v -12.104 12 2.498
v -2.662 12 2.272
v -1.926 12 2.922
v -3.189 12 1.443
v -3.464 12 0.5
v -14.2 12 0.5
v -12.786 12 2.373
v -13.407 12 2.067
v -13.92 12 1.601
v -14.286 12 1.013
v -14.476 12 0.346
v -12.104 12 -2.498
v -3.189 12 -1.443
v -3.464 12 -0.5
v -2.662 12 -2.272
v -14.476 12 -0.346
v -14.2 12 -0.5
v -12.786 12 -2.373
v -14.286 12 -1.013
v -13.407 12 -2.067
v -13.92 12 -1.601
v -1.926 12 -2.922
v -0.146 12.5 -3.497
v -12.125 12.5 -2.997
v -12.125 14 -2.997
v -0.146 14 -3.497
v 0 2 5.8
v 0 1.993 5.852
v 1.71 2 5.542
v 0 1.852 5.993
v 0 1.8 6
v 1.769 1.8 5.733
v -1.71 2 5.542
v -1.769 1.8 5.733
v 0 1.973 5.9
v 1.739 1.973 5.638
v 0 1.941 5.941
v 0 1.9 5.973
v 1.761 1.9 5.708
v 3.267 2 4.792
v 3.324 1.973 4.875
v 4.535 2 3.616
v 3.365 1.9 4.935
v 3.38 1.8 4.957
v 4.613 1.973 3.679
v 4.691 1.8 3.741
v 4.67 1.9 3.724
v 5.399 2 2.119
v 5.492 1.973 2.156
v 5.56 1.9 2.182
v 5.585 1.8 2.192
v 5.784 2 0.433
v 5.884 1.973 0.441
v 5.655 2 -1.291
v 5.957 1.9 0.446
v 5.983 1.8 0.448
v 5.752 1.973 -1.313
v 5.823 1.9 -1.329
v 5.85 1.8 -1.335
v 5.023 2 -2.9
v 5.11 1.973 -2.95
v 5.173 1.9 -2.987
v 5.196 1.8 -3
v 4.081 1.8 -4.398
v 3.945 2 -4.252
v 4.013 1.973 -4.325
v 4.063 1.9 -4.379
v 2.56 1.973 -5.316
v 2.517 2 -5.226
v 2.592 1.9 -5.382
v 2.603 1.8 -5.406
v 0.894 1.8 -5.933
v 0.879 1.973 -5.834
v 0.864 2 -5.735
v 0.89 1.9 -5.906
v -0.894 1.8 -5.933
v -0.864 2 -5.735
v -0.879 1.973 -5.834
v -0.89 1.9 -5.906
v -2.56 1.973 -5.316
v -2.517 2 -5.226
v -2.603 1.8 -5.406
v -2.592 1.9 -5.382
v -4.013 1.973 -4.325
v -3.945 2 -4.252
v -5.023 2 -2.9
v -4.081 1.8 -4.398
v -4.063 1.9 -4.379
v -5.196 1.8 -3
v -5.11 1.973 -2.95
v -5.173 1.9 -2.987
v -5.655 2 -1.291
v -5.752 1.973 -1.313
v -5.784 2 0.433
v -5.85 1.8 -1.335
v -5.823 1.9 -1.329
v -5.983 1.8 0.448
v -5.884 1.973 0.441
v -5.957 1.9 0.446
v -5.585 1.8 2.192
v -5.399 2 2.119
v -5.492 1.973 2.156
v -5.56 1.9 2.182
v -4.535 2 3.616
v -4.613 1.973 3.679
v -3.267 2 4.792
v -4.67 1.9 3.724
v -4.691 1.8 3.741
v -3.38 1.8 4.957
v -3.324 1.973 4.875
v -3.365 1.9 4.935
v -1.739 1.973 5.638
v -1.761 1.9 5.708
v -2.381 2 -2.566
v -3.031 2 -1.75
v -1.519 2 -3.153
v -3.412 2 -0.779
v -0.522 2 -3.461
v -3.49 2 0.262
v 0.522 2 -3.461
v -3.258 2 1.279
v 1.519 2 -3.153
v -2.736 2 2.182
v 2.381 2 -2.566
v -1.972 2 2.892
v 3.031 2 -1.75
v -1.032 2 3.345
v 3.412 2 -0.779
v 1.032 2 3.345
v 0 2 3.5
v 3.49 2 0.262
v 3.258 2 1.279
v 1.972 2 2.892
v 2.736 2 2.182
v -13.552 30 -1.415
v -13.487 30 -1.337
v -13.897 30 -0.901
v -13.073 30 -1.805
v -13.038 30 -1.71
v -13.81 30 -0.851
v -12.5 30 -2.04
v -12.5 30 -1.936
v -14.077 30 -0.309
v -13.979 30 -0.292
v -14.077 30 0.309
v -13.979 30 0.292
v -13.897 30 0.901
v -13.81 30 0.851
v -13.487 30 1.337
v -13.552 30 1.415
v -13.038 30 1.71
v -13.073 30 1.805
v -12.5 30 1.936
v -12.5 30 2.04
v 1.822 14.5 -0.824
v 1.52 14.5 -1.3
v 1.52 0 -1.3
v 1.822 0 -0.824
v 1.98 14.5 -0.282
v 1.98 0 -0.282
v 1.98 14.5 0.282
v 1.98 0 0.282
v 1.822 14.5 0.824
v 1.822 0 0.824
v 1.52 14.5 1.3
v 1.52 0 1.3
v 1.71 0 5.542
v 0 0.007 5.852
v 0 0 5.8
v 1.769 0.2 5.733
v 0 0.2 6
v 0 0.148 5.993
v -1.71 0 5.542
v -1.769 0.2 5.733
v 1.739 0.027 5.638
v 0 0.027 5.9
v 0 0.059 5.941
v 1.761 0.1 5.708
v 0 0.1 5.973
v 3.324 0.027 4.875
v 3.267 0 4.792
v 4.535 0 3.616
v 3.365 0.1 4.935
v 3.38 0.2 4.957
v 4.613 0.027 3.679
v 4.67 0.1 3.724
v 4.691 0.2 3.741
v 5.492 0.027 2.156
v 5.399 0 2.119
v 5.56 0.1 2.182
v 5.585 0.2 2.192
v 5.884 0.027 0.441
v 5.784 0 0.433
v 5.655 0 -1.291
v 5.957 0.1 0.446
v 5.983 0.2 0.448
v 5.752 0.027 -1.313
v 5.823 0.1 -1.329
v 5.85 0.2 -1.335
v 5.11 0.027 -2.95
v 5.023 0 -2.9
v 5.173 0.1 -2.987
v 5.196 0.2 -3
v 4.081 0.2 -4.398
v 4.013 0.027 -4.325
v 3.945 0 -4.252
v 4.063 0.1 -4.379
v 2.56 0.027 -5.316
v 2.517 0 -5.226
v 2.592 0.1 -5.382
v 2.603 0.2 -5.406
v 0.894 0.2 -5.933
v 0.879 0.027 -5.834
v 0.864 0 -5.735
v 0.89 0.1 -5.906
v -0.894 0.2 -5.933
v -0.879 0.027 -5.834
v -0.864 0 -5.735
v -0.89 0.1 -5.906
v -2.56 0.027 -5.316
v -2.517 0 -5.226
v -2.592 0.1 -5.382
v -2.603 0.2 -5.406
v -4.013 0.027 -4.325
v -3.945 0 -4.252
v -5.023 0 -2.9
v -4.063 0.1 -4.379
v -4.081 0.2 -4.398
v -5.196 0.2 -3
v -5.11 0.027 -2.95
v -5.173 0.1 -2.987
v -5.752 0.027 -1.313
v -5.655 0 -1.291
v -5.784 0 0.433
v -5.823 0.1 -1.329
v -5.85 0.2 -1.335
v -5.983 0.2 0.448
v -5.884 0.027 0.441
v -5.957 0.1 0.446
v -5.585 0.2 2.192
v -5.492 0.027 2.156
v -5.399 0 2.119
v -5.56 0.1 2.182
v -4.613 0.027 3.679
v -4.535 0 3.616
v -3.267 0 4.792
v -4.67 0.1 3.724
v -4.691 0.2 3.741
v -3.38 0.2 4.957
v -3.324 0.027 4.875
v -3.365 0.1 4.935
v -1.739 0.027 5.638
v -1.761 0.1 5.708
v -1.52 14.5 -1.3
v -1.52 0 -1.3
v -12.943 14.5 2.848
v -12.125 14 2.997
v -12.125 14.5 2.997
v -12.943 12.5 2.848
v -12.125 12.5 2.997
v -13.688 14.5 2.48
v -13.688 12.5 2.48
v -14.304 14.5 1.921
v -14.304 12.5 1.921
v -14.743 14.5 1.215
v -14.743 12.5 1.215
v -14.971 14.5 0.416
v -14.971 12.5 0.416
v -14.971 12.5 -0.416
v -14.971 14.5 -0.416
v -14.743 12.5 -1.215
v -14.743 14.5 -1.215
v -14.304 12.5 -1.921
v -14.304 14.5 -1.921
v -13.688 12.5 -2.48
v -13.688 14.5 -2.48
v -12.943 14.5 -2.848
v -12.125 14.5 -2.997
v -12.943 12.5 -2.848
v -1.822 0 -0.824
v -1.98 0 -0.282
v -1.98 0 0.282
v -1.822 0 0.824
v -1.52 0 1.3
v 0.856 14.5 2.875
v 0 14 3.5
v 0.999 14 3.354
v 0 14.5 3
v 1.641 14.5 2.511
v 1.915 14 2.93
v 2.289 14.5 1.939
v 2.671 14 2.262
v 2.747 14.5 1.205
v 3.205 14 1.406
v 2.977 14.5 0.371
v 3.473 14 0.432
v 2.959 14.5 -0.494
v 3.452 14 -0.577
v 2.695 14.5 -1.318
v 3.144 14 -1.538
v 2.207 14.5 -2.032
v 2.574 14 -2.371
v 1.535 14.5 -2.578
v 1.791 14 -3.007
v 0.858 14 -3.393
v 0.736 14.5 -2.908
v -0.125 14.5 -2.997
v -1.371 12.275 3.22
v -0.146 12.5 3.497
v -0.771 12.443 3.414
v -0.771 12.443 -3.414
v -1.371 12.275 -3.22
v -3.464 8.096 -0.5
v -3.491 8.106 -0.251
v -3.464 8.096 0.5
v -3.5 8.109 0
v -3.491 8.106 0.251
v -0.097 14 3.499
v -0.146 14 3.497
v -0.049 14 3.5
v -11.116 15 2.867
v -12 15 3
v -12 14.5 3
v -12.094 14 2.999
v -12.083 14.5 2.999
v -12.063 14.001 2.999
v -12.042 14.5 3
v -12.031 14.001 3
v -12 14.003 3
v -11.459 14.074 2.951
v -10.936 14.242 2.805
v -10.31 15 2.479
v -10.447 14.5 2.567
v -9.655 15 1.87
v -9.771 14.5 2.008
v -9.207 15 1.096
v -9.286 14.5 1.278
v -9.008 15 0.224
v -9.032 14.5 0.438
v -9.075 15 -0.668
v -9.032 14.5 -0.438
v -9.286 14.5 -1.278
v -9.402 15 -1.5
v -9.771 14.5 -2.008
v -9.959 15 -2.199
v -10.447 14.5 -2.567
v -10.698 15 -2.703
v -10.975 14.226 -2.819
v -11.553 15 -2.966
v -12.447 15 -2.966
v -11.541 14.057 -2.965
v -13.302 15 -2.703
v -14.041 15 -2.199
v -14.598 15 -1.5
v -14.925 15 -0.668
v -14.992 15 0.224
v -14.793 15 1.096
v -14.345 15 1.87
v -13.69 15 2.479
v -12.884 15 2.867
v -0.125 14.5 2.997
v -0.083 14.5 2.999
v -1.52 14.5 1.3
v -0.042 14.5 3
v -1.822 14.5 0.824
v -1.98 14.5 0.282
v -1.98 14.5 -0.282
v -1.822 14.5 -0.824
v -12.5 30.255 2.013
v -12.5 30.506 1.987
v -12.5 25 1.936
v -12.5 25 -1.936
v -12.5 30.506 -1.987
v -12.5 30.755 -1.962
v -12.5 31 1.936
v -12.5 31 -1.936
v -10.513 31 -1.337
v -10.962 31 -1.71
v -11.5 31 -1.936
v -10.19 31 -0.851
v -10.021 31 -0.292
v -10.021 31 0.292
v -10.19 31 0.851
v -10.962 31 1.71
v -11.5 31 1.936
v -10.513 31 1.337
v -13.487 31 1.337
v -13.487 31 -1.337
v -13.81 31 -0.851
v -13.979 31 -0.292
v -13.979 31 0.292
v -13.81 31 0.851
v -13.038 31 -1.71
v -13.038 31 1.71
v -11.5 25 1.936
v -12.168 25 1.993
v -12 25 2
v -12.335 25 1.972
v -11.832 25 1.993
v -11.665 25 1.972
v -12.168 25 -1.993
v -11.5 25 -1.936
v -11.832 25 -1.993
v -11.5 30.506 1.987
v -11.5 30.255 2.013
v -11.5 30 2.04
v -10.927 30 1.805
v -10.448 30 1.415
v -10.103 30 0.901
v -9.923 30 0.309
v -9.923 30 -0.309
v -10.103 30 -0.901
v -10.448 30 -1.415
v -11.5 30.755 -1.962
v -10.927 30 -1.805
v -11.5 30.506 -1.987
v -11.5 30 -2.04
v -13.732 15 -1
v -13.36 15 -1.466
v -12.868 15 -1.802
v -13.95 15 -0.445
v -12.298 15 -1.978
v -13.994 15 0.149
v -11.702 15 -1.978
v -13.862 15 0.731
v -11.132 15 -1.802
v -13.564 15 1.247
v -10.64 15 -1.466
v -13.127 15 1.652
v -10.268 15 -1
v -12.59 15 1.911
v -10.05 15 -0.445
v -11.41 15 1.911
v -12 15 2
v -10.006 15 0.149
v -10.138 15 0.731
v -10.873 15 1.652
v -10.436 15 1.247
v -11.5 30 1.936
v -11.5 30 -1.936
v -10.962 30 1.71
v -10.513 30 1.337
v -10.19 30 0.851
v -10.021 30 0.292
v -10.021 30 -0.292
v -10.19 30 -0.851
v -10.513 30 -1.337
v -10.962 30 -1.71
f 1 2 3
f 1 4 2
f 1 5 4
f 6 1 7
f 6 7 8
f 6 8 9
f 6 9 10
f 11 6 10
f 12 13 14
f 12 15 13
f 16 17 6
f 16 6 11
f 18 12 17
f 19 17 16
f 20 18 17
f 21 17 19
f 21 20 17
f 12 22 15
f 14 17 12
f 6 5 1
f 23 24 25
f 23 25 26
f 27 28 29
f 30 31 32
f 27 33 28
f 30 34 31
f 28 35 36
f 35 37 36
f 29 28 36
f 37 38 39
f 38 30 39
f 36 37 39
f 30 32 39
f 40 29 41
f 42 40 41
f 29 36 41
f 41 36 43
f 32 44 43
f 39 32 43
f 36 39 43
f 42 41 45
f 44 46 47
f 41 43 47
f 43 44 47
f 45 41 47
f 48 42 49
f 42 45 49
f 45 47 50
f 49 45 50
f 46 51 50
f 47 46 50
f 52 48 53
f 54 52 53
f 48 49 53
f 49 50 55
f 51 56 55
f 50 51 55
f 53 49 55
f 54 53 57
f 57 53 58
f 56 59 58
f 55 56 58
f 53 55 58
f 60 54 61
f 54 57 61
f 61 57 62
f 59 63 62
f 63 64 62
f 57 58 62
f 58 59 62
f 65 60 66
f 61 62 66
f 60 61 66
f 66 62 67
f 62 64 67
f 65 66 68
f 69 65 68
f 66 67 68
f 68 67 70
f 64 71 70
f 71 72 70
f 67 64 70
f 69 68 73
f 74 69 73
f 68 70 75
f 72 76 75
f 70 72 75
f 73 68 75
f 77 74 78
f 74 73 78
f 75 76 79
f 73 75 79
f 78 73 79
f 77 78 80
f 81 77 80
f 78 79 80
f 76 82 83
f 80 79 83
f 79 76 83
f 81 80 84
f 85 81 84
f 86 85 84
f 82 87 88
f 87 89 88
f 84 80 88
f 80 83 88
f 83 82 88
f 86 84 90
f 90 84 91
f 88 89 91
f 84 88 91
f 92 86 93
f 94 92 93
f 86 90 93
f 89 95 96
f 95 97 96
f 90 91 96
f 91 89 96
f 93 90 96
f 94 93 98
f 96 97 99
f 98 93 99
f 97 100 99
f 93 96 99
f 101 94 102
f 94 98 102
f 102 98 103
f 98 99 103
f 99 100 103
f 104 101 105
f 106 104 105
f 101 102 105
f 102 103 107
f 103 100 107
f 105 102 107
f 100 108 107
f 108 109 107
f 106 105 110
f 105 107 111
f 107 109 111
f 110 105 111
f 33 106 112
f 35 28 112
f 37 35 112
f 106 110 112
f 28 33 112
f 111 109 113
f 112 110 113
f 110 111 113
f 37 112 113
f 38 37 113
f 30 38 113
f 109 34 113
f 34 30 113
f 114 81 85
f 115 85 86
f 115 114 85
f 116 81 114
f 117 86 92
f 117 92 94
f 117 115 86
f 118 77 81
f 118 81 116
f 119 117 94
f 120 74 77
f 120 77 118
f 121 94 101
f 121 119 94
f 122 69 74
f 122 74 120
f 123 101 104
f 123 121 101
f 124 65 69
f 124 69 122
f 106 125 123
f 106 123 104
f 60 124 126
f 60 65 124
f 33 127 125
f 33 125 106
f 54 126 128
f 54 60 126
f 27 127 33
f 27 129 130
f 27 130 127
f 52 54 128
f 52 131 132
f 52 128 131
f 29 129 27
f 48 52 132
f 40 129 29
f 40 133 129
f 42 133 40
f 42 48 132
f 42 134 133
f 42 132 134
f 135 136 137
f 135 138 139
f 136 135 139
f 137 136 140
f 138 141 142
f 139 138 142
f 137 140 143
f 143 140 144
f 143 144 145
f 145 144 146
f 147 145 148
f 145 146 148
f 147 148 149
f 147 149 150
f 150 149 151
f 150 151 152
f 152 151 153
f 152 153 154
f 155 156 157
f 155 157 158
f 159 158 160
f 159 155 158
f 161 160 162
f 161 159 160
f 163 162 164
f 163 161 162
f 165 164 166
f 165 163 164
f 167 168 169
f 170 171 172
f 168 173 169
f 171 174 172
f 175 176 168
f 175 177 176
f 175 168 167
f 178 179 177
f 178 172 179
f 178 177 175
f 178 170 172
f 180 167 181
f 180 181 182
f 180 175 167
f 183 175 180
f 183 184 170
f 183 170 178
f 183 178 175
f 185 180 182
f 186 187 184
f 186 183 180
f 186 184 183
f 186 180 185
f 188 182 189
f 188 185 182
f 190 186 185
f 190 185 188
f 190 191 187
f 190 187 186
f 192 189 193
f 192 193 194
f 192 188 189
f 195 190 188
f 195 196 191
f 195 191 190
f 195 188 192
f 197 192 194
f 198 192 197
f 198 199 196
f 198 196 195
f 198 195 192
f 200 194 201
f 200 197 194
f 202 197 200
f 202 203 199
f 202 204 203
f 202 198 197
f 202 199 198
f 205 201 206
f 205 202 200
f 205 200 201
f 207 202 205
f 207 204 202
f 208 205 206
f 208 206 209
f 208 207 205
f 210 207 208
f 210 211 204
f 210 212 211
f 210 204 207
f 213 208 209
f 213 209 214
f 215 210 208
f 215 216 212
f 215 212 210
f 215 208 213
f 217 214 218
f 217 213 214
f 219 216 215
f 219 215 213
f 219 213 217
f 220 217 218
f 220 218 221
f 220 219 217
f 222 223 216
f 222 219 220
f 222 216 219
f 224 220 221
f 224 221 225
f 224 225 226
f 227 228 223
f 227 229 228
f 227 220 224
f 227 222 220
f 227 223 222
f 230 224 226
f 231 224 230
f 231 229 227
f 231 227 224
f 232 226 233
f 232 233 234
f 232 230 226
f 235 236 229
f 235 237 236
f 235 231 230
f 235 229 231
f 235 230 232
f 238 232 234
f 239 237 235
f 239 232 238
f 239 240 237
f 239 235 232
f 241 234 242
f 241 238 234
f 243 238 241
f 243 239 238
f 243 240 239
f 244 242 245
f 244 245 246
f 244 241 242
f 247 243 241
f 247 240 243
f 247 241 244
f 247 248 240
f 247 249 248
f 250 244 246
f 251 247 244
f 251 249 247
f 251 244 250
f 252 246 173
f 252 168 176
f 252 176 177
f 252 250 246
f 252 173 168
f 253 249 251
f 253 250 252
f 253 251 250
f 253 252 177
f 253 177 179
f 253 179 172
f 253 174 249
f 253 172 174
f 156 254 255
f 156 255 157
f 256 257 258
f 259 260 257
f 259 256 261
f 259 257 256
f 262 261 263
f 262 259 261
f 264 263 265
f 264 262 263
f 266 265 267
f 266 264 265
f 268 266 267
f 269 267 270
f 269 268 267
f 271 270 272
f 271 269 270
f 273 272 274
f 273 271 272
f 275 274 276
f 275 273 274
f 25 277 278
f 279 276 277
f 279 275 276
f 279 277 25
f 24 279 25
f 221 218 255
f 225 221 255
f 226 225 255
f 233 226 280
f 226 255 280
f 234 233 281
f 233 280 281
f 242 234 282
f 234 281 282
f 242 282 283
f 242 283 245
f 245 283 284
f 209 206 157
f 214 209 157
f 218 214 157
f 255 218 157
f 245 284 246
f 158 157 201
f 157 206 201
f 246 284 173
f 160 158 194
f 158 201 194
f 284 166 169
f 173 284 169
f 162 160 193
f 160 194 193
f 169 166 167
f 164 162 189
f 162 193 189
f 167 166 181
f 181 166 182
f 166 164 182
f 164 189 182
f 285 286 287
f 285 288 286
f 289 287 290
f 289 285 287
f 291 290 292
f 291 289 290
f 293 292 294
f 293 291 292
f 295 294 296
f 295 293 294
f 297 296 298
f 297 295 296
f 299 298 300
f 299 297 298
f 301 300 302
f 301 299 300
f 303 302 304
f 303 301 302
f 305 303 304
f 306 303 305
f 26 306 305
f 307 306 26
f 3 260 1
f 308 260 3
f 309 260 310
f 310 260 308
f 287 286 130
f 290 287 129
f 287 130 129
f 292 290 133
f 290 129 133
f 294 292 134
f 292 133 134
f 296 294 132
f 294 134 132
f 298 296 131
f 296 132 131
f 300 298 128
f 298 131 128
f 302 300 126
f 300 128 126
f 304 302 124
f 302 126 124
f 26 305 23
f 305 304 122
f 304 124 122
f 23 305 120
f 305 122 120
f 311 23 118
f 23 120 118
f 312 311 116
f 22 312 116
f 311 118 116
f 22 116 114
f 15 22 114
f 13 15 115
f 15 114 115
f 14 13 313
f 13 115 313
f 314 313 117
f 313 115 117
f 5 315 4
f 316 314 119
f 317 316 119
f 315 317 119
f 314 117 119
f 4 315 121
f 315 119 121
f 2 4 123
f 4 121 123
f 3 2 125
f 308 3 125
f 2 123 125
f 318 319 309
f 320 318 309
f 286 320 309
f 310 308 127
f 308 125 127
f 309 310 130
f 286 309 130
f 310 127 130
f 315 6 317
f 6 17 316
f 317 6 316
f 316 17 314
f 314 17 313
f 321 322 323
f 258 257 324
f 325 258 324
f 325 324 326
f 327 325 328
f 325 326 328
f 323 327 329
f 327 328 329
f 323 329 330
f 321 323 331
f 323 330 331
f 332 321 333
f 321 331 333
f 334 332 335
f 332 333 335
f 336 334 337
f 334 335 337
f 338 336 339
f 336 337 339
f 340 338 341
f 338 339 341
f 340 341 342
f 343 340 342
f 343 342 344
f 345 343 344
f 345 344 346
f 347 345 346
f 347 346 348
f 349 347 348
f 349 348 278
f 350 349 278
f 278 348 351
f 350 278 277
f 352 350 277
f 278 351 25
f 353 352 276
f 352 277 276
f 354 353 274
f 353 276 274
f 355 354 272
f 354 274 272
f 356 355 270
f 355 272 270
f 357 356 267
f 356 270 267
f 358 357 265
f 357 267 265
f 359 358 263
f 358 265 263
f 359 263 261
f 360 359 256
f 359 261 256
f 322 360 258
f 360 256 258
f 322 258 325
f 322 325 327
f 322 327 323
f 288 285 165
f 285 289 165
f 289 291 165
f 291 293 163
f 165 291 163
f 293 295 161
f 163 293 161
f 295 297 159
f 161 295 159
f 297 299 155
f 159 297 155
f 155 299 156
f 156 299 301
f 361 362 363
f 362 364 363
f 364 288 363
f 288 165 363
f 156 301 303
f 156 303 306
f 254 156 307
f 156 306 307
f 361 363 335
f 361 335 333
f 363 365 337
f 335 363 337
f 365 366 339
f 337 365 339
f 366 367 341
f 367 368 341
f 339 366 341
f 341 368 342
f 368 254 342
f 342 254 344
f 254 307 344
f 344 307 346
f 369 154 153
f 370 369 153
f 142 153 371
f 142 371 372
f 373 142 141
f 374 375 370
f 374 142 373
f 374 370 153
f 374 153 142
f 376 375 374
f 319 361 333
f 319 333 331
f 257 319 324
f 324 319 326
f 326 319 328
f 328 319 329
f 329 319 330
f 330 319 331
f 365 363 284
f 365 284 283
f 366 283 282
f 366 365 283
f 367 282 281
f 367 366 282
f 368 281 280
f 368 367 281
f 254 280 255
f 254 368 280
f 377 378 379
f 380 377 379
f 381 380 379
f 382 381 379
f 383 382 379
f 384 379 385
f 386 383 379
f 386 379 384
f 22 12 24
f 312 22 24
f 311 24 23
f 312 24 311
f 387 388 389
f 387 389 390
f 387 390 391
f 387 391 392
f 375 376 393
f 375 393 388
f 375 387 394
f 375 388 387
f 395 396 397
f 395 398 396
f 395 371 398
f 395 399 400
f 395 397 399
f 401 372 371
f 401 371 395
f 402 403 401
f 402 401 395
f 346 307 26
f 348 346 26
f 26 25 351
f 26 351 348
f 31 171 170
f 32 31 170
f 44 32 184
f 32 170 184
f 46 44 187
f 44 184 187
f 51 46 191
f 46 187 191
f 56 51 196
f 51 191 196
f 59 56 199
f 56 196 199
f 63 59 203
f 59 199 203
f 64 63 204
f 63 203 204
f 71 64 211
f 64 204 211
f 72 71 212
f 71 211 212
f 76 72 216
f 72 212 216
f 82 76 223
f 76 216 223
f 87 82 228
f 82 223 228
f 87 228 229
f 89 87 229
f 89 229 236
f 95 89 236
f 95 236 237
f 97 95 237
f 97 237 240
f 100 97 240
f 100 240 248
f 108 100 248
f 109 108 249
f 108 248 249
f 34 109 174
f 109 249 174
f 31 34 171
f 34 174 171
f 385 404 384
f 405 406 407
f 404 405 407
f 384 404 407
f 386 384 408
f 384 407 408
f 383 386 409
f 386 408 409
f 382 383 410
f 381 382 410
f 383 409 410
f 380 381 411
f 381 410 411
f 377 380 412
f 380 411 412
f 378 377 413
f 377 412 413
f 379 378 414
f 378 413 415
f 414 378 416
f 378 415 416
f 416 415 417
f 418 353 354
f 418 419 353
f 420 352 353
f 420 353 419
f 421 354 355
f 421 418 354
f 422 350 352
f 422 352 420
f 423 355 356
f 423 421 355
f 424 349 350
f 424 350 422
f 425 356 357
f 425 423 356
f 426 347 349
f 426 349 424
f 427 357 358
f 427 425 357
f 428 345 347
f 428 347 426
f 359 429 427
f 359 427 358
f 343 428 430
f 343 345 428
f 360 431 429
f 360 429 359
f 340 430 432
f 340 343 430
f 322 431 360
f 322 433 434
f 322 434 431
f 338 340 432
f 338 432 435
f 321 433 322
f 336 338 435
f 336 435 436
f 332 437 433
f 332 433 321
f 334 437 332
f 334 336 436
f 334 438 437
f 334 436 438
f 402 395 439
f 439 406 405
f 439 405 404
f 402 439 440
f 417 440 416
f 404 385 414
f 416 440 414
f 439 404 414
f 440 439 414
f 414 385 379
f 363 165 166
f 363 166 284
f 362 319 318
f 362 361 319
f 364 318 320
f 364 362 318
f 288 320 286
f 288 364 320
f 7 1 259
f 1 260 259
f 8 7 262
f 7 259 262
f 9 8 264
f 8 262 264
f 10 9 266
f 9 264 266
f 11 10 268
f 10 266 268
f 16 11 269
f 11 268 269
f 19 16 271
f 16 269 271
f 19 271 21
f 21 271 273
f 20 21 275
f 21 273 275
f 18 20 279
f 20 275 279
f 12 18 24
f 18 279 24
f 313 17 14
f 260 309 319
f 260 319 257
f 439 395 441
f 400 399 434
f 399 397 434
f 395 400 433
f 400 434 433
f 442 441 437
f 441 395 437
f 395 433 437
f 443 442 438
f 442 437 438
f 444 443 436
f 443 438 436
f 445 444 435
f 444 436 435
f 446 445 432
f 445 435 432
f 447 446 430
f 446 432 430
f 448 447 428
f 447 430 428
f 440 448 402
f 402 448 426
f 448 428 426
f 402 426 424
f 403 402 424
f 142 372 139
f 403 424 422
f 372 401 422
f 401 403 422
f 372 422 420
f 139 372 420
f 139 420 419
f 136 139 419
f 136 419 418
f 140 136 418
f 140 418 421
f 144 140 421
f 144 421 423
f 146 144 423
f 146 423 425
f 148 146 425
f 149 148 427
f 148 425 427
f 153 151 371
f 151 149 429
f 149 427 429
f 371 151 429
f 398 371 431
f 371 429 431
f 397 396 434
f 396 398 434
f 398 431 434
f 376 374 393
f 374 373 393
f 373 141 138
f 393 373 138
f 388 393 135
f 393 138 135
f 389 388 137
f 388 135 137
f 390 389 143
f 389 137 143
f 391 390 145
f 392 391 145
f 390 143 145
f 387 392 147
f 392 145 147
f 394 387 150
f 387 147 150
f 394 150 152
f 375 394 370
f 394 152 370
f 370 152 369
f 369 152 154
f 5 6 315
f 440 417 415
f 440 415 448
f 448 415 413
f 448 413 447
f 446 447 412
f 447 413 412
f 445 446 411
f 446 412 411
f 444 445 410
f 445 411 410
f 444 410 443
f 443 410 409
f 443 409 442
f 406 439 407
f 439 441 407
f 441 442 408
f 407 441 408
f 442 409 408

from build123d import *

# Parameters (mm, degrees)
SKETCH_1_R           = 6
EXTRUDE_1_DEPTH      = 2
SKETCH_2_R           = 3.5
EXTRUDE_2_DEPTH      = 12.5
EXTRUDE_START        = -2.5
EXTRUDE_3_DEPTH      = 2.5
EXTRUDE_4_DEPTH      = 0.5
EXTRUDE_4_DEPTH_BACK = 0.5
SKETCH_5_R           = 3
EXTRUDE_5_DEPTH      = 0.5
SKETCH_6_R           = 2
EXTRUDE_6_DEPTH      = 16
SKETCH_8_W           = 1
SKETCH_8_H           = 6
CUT_EXTRUDE_1_DEPTH  = 6
CUT_EXTRUDE_2_DEPTH  = 24.092206478
FILLET_1_R           = 0.2
CHAMFER_1_SIZE       = 0.5


with BuildPart() as part:
    # 草图1 → 凸台-拉伸1 (new body)
    with BuildSketch(Plane(origin=(0, 0, 0), x_dir=(1, 0, 0), z_dir=(0, 1, 0))):
        with Locations(Location((0, 0, 0), (0, 0, 270))):
            Circle(SKETCH_1_R)
    extrude(amount=EXTRUDE_1_DEPTH)

    # 草图2 → 凸台-拉伸2 (add)
    with BuildSketch(Plane(origin=(0, 2, 0), x_dir=(1, 0, 0), z_dir=(0, 1, 0))):
        with Locations(Location((0, 0, 0), (0, 0, 270))):
            Circle(SKETCH_2_R)
    extrude(amount=EXTRUDE_2_DEPTH)

    # 草图3 → 凸台-拉伸3 (add)
    with BuildSketch(Plane(origin=(0, 14.5, 0), x_dir=(1, 0, 0), z_dir=(0, 1, 0)).offset(EXTRUDE_START)):
        with BuildLine():
            Line((-12.125, 2.997394702), (-0.145833333, 3.496960486))
            ThreePointArc((-0.145833333, 3.496960486), (3.5, 0), (-0.145833333, -3.496960486))
            Line((-0.145833333, -3.496960486), (-12.125, -2.997394702))
            ThreePointArc((-12.125, -2.997394702), (-15, 0), (-12.125, 2.997394702))
        make_face()
    extrude(amount=EXTRUDE_3_DEPTH)

    # 草图4 → 凸台-拉伸4 (add, two sides: drawn at the far end of the back side and taken through both)
    with BuildSketch(Plane.XY.offset(-EXTRUDE_4_DEPTH_BACK)):
        Polygon((-14.2, 12), (-3.2, 8), (-0.2, 6.909090909), (-0.2, 12), (-3.2, 12), align=None)
    extrude(amount=EXTRUDE_4_DEPTH + EXTRUDE_4_DEPTH_BACK)

    # 草图5 → 凸台-拉伸5 (add)
    with BuildSketch(Plane(origin=(0, 14.5, 0), x_dir=(1, 0, 0), z_dir=(0, 1, 0))):
        with Locations(Location((-12, 0, 0), (0, 0, 270))):
            Circle(SKETCH_5_R)
    extrude(amount=EXTRUDE_5_DEPTH)

    # 草图6 → 凸台-拉伸6 (add)
    with BuildSketch(Plane(origin=(0, 15, 0), x_dir=(1, 0, 0), z_dir=(0, 1, 0))):
        with Locations(Location((-12, 0, 0), (0, 0, 270))):
            Circle(SKETCH_6_R)
    extrude(amount=EXTRUDE_6_DEPTH)

    # 草图7 → 旋转1 (revolve)
    with BuildSketch(Plane.XY, mode=Mode.PRIVATE) as revolve_1_sk:
        Polygon((-12, 31), (-14, 31), (-14.1, 30), (-12, 30), align=None)
    revolve(revolve_1_sk.sketch.rotate(Axis((-12, 30, 0), (0, 1, 0)), 90), axis=Axis((-12, 30, 0), (0, 1, 0)))

    # 草图8 → 切除-拉伸1 (cut)
    with BuildSketch(Plane(origin=(0, 31, 0), x_dir=(1, 0, 0), z_dir=(0, 1, 0))):
        with Locations((-12, 0)):
            Rectangle(SKETCH_8_W, SKETCH_8_H)
    extrude(amount=-CUT_EXTRUDE_1_DEPTH, mode=Mode.SUBTRACT)

    # 草图9 → 切除-拉伸2 (cut, through all)
    with BuildSketch(Plane(origin=(0, 14.5, 0), x_dir=(1, 0, 0), z_dir=(0, 1, 0))):
        with BuildLine():
            Line((1.519868415, -1.3), (-1.519868415, -1.3))
            ThreePointArc((-1.519868415, -1.3), (-2, 0), (-1.519868415, 1.3))
            Line((-1.519868415, 1.3), (1.519868415, 1.3))
            ThreePointArc((1.519868415, 1.3), (2, 0), (1.519868415, -1.3))
        make_face()
    extrude(amount=-CUT_EXTRUDE_2_DEPTH, mode=Mode.SUBTRACT)

    # 圆角1
    fillet_1_edges = [part.edges().sort_by_distance(p)[0] for p in [
        (0, 0, -6),
        (0, 2, -6),
    ]]
    fillet(fillet_1_edges, radius=FILLET_1_R)

    # 倒角1
    # the kernel refuses this chamfer: 0.5 mm, written as the material it takes off along each edge
    with BuildSketch(Plane(origin=(1.138891494, 12, 3.550537215), x_dir=(-0.0011456615254410918, 0.9996219169112968, 0.02747199829378469), z_dir=(-0.9991315673568166, 0, -0.041666666666666574))) as chamfer_1_piece_1_section:
        Polygon((CHAMFER_1_SIZE * 0.999621916911, CHAMFER_1_SIZE * 0.0274958766106), (-CHAMFER_1_SIZE * 0.0274958766106, CHAMFER_1_SIZE * 0.999621916911), (0, 0), align=None)
    chamfer_1_piece_1 = extrude(amount=13.275420302, mode=Mode.PRIVATE)
    chamfer_1_piece_1 = chamfer_1_piece_1 - Plane(origin=(0, 12.171019003, 0), x_dir=(0, 0, 1), z_dir=(0, -1, 0)) * Cylinder(3.5, 29, mode=Mode.PRIVATE)
    add(chamfer_1_piece_1, mode=Mode.SUBTRACT)
    with BuildSketch(Plane(origin=(-12, 12, 0), x_dir=(-0.041666666666666664, 0, 0.9991315673568165), z_dir=(0.9991315673568165, 0, 0.041666666666666664))) as chamfer_1_piece_2:
        Polygon((3 - CHAMFER_1_SIZE, 0), (3, -CHAMFER_1_SIZE), (3, 0), align=None)
    revolve(axis=Axis((-12, 12, 0), (0, -1, 0)), revolution_arc=175.223969073, mode=Mode.SUBTRACT)
    with BuildSketch(Plane(origin=(-12.125, 12, -2.997394702), x_dir=(0.04165091320463745, -0.027495876610585623, 0.9987538126078094), z_dir=(0.9991315673568165, 0, -0.041666666666666755))) as chamfer_1_piece_3_section:
        Polygon((CHAMFER_1_SIZE * 0.999621916911, -CHAMFER_1_SIZE * 0.0274958766106), (-CHAMFER_1_SIZE * 0.0274958766106, -CHAMFER_1_SIZE * 0.999621916911), (0, 0), align=None)
    chamfer_1_piece_3 = extrude(amount=13.275420302, mode=Mode.PRIVATE)
    chamfer_1_piece_3 = chamfer_1_piece_3 - Plane(origin=(0, 12.143445787, 0), x_dir=(0, 0, 1), z_dir=(0, -1, 0)) * Cylinder(3.5, 29, mode=Mode.PRIVATE)
    add(chamfer_1_piece_3, mode=Mode.SUBTRACT)
    with BuildSketch(Plane(origin=(-13.409724827, 14.5, -2.943817973), x_dir=(0.04165091320463745, 0.027495876610585623, 0.9987538126078094), z_dir=(0.9991315673568165, 0, -0.041666666666666755))) as chamfer_1_piece_4_section:
        Polygon((CHAMFER_1_SIZE * 0.999621916911, CHAMFER_1_SIZE * 0.0274958766106), (-CHAMFER_1_SIZE * 0.0274958766106, CHAMFER_1_SIZE * 0.999621916911), (0, 0), align=None)
    chamfer_1_piece_4 = extrude(amount=13.275420302, mode=Mode.PRIVATE)
    chamfer_1_piece_4 = chamfer_1_piece_4 - Plane(origin=(-12, 14.328980995, 0), x_dir=(0, 0, 1), z_dir=(0, -1, 0)) * Cylinder(3, 29, mode=Mode.PRIVATE)
    add(chamfer_1_piece_4, mode=Mode.SUBTRACT)
    with BuildSketch(Plane(origin=(0, 14.5, 0), x_dir=(0, 0, 1), z_dir=(-1, 0, 0))) as chamfer_1_piece_5:
        Polygon((3.5, -CHAMFER_1_SIZE), (3.5 - CHAMFER_1_SIZE, 0), (3.5, 0), align=None)
    revolve(axis=Axis((0, 14.5, 0), (0, 1, 0)), revolution_arc=182.388015463, mode=Mode.SUBTRACT)
    with BuildSketch(Plane(origin=(-0.145833333, 14.5, 3.496960486), x_dir=(0.04165091320463727, 0.027495876610585623, -0.9987538126078094), z_dir=(-0.9991315673568166, 0, -0.041666666666666574))) as chamfer_1_piece_6_section:
        Polygon((CHAMFER_1_SIZE * 0.999621916911, CHAMFER_1_SIZE * 0.0274958766106), (-CHAMFER_1_SIZE * 0.0274958766106, CHAMFER_1_SIZE * 0.999621916911), (0, 0), align=None)
    chamfer_1_piece_6 = extrude(amount=13.275420302, mode=Mode.PRIVATE)
    chamfer_1_piece_6 = chamfer_1_piece_6 - Plane(origin=(-12, 14.356641066, 0), x_dir=(0, 0, 1), z_dir=(0, -1, 0)) * Cylinder(3, 29, mode=Mode.PRIVATE)
    add(chamfer_1_piece_6, mode=Mode.SUBTRACT)
    with BuildSketch(Plane(origin=(0, 14.5, 0), x_dir=(-0.04166666666666704, 0, 0.9991315673568166), z_dir=(-0.9991315673568166, 0, -0.04166666666666704))) as chamfer_1_piece_7:
        Polygon((3.5, -CHAMFER_1_SIZE), (3.5 - CHAMFER_1_SIZE, 0), (3.5, 0), align=None)
    revolve(axis=Axis((0, 14.5, 0), (0, 1, 0)), revolution_arc=2.388015463, mode=Mode.SUBTRACT)


solid = part.part
